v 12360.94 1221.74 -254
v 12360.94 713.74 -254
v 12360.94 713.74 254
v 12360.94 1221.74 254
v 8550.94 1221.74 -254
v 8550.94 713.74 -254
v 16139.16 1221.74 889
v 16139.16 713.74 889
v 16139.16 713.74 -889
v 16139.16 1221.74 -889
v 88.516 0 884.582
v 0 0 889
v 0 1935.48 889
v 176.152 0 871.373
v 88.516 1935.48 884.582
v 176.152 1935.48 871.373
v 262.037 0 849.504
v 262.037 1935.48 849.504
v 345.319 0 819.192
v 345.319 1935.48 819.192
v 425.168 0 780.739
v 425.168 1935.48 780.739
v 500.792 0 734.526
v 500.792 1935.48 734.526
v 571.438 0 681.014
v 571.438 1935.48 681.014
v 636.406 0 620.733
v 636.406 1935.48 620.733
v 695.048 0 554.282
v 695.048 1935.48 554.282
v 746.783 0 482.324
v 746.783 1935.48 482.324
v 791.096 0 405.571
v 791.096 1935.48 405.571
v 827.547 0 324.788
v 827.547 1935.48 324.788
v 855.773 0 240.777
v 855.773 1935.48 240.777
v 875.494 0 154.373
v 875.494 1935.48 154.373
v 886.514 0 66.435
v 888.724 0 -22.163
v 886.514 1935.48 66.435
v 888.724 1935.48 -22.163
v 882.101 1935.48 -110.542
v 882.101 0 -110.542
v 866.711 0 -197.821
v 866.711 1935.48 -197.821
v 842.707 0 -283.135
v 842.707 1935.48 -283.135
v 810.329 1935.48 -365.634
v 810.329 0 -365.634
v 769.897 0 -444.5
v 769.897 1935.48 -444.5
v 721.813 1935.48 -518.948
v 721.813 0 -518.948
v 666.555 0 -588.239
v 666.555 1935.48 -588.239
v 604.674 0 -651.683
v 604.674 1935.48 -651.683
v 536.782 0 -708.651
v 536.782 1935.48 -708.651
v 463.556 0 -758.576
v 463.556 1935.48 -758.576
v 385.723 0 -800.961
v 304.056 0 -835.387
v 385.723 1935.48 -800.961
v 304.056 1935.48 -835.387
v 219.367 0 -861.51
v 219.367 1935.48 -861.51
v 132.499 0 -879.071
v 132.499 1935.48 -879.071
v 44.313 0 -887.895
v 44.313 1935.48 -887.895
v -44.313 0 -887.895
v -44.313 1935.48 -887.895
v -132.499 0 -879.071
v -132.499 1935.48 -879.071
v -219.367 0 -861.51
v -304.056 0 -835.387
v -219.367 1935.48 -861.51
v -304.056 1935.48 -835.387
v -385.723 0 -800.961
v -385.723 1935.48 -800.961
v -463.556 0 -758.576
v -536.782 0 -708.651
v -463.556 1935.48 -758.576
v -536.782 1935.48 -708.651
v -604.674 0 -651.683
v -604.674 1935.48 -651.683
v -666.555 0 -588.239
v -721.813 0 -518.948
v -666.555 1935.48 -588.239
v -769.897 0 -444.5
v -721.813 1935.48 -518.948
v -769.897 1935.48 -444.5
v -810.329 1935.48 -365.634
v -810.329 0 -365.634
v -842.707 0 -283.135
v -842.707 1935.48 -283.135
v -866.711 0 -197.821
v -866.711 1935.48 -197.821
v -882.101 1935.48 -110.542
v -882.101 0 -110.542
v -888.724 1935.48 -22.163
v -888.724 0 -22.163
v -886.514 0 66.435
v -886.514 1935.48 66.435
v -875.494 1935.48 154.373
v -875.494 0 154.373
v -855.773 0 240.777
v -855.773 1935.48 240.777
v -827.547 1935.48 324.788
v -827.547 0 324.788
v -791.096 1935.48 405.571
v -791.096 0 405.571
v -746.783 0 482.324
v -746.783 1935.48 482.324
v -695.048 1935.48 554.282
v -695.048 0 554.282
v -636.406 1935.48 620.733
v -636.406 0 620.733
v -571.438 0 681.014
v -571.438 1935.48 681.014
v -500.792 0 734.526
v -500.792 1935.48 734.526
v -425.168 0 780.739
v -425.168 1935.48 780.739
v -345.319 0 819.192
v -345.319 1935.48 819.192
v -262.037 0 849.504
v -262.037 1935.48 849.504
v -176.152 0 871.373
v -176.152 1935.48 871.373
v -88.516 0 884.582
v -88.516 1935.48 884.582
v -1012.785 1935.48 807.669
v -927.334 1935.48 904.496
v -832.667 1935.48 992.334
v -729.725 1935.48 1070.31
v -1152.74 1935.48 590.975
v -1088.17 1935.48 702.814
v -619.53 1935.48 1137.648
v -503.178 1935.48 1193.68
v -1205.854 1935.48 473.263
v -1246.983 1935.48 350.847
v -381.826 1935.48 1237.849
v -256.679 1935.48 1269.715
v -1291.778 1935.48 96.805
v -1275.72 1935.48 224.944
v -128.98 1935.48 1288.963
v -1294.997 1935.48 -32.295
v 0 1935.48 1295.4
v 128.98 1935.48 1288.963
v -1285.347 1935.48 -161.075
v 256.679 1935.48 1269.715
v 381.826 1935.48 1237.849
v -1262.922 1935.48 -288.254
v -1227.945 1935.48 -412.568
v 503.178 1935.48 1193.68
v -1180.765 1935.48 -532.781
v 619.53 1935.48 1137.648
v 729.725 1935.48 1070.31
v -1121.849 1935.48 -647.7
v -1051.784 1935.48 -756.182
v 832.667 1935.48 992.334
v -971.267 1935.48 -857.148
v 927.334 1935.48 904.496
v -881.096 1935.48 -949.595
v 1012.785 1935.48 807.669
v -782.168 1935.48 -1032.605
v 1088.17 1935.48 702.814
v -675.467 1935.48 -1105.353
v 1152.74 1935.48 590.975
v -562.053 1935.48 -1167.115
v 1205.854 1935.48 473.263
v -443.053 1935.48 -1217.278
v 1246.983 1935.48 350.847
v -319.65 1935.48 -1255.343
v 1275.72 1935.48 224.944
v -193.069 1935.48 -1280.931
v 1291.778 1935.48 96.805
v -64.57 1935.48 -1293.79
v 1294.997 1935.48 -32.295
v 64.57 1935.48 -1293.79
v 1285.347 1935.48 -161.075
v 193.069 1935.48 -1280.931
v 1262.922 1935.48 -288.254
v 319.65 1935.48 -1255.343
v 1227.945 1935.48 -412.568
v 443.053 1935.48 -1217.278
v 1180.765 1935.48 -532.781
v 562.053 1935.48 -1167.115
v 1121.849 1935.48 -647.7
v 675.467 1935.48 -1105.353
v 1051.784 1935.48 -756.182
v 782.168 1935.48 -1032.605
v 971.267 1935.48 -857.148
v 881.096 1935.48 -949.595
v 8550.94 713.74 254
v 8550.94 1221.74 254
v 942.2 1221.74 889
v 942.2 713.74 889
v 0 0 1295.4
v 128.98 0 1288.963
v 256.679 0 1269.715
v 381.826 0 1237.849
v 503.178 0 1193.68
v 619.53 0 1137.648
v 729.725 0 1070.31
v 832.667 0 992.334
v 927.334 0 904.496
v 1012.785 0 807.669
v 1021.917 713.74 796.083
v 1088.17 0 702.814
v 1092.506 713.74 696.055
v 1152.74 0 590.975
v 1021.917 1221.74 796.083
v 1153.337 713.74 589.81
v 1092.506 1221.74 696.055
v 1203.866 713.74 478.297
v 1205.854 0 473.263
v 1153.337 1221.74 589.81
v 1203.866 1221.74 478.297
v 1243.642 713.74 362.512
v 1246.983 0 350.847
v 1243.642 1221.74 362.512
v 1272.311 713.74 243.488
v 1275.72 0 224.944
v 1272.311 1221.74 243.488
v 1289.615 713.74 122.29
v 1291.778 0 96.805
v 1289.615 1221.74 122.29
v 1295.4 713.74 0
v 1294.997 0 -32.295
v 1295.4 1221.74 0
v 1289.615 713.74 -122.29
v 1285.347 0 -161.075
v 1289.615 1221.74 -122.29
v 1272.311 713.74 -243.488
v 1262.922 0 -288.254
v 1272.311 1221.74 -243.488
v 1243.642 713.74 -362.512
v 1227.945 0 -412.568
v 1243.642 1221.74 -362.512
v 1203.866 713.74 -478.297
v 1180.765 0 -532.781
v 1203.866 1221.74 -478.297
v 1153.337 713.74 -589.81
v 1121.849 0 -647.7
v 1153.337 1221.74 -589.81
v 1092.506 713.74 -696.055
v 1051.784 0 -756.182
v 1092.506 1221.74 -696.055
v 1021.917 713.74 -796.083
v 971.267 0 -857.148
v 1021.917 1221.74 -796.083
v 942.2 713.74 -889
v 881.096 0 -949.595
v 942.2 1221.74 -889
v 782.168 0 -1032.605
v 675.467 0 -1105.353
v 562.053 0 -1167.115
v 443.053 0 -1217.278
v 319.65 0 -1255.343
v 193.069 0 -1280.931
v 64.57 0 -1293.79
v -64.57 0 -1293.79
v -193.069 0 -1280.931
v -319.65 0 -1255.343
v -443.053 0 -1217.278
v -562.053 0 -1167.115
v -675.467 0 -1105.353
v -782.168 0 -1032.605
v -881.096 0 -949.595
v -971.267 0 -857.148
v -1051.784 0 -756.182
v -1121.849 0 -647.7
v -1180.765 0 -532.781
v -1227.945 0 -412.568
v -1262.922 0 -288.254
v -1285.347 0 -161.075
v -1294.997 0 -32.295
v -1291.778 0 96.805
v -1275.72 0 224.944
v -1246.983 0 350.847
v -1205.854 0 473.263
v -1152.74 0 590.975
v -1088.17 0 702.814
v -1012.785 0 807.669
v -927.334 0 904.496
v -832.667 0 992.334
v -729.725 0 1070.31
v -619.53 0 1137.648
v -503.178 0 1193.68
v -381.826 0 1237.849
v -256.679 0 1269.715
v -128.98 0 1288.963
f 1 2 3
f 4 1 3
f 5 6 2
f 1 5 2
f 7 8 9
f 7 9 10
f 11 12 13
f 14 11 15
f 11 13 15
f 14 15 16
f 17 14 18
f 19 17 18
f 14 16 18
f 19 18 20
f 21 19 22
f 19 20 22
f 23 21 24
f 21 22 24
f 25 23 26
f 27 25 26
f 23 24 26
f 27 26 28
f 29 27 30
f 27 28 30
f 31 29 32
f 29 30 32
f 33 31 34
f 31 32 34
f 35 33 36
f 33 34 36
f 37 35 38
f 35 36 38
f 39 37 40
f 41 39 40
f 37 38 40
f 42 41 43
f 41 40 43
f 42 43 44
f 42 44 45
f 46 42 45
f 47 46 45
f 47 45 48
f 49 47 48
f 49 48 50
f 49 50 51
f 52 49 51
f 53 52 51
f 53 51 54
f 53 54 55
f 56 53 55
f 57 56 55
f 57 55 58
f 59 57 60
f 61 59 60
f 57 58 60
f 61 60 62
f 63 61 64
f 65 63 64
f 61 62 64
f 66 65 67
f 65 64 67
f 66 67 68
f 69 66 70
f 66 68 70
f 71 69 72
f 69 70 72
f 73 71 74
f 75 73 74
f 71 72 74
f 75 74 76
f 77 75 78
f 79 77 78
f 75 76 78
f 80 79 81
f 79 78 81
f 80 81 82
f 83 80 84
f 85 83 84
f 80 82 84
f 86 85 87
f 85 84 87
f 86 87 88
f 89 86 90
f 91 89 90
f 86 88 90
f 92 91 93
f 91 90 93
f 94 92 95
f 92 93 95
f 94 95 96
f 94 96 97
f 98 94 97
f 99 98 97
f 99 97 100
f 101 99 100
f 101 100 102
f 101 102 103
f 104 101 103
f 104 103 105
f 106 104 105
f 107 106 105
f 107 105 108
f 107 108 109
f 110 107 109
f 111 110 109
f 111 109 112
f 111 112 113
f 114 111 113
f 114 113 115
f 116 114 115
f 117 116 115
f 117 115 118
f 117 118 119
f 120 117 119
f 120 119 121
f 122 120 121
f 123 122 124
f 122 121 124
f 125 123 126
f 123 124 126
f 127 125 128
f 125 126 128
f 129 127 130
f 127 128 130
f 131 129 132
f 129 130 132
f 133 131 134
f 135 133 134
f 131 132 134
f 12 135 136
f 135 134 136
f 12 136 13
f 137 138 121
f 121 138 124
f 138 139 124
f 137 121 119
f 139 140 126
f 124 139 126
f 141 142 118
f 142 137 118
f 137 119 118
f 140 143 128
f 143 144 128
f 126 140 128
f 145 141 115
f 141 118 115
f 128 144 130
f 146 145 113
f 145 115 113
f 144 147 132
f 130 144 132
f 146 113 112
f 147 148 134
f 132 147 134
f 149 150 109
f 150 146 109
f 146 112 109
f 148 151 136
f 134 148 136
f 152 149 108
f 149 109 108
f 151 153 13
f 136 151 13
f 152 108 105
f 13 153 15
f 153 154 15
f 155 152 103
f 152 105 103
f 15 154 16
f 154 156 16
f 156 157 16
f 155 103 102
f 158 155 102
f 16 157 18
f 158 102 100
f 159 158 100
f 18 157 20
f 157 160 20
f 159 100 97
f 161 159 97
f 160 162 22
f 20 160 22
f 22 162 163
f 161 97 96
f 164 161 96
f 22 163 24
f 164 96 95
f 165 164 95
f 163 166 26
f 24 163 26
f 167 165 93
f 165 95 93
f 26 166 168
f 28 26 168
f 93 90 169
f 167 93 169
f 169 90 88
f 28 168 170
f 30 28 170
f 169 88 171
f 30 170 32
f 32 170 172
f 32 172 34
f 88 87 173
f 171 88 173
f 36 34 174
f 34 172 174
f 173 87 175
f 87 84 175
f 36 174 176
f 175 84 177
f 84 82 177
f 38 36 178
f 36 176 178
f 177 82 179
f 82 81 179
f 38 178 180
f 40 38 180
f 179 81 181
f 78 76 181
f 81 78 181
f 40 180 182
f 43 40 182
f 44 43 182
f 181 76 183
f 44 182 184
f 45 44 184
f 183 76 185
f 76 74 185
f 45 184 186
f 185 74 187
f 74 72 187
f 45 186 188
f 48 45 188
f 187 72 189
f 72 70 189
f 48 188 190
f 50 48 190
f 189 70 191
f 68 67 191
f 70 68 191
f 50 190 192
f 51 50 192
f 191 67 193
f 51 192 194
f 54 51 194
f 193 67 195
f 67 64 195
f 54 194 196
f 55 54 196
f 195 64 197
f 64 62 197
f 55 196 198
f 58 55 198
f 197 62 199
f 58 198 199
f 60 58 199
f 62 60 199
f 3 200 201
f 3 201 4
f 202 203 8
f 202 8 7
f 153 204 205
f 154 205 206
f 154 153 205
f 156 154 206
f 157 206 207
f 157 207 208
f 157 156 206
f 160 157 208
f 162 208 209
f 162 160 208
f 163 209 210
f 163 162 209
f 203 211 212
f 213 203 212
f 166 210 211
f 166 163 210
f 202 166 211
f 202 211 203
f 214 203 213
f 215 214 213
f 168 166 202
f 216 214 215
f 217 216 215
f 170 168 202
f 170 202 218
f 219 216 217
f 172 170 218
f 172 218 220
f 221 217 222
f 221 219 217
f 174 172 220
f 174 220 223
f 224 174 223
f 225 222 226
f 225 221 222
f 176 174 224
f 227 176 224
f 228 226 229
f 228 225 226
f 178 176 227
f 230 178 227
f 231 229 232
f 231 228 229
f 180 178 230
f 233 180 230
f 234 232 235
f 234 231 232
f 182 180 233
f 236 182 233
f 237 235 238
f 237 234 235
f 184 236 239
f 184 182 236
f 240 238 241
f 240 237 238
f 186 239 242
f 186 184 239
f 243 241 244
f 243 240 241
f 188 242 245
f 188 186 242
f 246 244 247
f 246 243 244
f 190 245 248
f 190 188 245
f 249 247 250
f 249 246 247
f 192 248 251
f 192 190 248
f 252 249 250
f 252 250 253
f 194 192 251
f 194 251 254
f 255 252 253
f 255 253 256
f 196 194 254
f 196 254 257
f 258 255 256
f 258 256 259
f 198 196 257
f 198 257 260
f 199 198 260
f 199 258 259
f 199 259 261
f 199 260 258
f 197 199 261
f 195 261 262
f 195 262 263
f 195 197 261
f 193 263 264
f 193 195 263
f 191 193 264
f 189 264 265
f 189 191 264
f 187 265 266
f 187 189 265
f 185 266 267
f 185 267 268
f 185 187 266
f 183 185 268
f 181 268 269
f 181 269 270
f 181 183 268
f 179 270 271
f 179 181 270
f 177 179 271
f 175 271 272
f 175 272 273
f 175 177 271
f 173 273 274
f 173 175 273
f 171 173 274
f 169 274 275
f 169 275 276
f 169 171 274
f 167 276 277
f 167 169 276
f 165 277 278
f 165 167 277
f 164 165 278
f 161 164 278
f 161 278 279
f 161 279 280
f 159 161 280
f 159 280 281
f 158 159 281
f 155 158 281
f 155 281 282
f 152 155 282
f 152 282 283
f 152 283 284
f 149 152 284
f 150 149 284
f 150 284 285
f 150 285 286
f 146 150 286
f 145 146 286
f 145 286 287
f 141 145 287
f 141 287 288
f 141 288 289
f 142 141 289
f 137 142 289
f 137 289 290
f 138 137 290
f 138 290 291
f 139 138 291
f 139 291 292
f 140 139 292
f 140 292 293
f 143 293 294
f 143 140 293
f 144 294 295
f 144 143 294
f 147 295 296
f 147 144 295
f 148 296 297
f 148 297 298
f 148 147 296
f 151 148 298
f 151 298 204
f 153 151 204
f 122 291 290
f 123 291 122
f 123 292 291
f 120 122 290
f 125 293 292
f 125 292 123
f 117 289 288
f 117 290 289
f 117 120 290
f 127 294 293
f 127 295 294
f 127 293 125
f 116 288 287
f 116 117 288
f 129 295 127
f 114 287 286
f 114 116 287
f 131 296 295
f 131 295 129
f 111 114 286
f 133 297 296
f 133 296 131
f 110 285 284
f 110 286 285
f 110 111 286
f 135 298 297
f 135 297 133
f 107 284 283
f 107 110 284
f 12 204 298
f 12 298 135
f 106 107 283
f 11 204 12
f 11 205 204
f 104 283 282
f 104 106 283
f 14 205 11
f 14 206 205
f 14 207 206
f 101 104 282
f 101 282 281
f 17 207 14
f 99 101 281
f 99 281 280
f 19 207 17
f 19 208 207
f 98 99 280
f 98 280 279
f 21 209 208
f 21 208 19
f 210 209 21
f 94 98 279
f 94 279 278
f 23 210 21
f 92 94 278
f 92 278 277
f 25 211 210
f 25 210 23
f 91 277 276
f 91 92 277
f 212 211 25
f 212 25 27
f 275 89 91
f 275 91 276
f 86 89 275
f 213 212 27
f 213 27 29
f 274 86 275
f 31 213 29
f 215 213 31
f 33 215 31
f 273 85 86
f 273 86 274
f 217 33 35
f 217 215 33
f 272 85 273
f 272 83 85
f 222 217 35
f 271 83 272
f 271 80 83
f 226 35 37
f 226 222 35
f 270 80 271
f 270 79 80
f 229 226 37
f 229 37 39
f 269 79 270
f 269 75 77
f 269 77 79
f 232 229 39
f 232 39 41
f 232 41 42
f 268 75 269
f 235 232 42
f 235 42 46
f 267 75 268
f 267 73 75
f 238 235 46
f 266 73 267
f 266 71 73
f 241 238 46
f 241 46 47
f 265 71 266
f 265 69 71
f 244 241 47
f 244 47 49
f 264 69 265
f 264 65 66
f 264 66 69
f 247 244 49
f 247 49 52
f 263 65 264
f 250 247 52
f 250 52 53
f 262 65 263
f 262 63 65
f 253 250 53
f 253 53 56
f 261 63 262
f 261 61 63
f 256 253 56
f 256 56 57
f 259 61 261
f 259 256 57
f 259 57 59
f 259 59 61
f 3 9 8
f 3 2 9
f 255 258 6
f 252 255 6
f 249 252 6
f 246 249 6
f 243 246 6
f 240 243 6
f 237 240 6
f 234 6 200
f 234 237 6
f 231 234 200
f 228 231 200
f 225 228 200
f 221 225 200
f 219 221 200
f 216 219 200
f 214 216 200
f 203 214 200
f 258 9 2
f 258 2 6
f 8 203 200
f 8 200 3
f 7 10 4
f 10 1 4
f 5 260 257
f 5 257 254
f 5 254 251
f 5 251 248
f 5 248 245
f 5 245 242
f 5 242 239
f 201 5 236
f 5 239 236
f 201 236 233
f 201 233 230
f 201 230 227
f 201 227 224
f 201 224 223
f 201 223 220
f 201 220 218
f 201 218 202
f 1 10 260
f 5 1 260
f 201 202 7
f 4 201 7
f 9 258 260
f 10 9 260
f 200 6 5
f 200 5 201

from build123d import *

# Parameters (mm, degrees)
F0_W     = 1935.48
F0_H     = 406.4
F3_W     = 508
F3_H     = 1778
F4_DEPTH = 15240
F5_W     = 3810
F5_H     = 508
F6_DEPTH = 1221.741


with BuildPart() as f1:
    # F0 (on Right) → F1 (revolve)
    with BuildSketch(Plane.YZ):
        with Locations((967.74, 1092.2)):
            Rectangle(F0_W, F0_H)
    revolve(axis=Axis((0, 366.825014, 0), (0, 1, 0)))

    # F3 (on offset) → F4 (join)
    with BuildSketch(Plane.YZ.offset(899.16)):
        with Locations((967.74, 0)):
            Rectangle(F3_W, F3_H)
    extrude(amount=F4_DEPTH)

    # F5 (on face) → F6 (cut, through all)
    with BuildSketch(Plane.XZ.offset(-713.74)):
        with Locations((10455.9403, 0)):
            Rectangle(F5_W, F5_H)
    extrude(amount=-F6_DEPTH, mode=Mode.SUBTRACT)


solid = f1.part
